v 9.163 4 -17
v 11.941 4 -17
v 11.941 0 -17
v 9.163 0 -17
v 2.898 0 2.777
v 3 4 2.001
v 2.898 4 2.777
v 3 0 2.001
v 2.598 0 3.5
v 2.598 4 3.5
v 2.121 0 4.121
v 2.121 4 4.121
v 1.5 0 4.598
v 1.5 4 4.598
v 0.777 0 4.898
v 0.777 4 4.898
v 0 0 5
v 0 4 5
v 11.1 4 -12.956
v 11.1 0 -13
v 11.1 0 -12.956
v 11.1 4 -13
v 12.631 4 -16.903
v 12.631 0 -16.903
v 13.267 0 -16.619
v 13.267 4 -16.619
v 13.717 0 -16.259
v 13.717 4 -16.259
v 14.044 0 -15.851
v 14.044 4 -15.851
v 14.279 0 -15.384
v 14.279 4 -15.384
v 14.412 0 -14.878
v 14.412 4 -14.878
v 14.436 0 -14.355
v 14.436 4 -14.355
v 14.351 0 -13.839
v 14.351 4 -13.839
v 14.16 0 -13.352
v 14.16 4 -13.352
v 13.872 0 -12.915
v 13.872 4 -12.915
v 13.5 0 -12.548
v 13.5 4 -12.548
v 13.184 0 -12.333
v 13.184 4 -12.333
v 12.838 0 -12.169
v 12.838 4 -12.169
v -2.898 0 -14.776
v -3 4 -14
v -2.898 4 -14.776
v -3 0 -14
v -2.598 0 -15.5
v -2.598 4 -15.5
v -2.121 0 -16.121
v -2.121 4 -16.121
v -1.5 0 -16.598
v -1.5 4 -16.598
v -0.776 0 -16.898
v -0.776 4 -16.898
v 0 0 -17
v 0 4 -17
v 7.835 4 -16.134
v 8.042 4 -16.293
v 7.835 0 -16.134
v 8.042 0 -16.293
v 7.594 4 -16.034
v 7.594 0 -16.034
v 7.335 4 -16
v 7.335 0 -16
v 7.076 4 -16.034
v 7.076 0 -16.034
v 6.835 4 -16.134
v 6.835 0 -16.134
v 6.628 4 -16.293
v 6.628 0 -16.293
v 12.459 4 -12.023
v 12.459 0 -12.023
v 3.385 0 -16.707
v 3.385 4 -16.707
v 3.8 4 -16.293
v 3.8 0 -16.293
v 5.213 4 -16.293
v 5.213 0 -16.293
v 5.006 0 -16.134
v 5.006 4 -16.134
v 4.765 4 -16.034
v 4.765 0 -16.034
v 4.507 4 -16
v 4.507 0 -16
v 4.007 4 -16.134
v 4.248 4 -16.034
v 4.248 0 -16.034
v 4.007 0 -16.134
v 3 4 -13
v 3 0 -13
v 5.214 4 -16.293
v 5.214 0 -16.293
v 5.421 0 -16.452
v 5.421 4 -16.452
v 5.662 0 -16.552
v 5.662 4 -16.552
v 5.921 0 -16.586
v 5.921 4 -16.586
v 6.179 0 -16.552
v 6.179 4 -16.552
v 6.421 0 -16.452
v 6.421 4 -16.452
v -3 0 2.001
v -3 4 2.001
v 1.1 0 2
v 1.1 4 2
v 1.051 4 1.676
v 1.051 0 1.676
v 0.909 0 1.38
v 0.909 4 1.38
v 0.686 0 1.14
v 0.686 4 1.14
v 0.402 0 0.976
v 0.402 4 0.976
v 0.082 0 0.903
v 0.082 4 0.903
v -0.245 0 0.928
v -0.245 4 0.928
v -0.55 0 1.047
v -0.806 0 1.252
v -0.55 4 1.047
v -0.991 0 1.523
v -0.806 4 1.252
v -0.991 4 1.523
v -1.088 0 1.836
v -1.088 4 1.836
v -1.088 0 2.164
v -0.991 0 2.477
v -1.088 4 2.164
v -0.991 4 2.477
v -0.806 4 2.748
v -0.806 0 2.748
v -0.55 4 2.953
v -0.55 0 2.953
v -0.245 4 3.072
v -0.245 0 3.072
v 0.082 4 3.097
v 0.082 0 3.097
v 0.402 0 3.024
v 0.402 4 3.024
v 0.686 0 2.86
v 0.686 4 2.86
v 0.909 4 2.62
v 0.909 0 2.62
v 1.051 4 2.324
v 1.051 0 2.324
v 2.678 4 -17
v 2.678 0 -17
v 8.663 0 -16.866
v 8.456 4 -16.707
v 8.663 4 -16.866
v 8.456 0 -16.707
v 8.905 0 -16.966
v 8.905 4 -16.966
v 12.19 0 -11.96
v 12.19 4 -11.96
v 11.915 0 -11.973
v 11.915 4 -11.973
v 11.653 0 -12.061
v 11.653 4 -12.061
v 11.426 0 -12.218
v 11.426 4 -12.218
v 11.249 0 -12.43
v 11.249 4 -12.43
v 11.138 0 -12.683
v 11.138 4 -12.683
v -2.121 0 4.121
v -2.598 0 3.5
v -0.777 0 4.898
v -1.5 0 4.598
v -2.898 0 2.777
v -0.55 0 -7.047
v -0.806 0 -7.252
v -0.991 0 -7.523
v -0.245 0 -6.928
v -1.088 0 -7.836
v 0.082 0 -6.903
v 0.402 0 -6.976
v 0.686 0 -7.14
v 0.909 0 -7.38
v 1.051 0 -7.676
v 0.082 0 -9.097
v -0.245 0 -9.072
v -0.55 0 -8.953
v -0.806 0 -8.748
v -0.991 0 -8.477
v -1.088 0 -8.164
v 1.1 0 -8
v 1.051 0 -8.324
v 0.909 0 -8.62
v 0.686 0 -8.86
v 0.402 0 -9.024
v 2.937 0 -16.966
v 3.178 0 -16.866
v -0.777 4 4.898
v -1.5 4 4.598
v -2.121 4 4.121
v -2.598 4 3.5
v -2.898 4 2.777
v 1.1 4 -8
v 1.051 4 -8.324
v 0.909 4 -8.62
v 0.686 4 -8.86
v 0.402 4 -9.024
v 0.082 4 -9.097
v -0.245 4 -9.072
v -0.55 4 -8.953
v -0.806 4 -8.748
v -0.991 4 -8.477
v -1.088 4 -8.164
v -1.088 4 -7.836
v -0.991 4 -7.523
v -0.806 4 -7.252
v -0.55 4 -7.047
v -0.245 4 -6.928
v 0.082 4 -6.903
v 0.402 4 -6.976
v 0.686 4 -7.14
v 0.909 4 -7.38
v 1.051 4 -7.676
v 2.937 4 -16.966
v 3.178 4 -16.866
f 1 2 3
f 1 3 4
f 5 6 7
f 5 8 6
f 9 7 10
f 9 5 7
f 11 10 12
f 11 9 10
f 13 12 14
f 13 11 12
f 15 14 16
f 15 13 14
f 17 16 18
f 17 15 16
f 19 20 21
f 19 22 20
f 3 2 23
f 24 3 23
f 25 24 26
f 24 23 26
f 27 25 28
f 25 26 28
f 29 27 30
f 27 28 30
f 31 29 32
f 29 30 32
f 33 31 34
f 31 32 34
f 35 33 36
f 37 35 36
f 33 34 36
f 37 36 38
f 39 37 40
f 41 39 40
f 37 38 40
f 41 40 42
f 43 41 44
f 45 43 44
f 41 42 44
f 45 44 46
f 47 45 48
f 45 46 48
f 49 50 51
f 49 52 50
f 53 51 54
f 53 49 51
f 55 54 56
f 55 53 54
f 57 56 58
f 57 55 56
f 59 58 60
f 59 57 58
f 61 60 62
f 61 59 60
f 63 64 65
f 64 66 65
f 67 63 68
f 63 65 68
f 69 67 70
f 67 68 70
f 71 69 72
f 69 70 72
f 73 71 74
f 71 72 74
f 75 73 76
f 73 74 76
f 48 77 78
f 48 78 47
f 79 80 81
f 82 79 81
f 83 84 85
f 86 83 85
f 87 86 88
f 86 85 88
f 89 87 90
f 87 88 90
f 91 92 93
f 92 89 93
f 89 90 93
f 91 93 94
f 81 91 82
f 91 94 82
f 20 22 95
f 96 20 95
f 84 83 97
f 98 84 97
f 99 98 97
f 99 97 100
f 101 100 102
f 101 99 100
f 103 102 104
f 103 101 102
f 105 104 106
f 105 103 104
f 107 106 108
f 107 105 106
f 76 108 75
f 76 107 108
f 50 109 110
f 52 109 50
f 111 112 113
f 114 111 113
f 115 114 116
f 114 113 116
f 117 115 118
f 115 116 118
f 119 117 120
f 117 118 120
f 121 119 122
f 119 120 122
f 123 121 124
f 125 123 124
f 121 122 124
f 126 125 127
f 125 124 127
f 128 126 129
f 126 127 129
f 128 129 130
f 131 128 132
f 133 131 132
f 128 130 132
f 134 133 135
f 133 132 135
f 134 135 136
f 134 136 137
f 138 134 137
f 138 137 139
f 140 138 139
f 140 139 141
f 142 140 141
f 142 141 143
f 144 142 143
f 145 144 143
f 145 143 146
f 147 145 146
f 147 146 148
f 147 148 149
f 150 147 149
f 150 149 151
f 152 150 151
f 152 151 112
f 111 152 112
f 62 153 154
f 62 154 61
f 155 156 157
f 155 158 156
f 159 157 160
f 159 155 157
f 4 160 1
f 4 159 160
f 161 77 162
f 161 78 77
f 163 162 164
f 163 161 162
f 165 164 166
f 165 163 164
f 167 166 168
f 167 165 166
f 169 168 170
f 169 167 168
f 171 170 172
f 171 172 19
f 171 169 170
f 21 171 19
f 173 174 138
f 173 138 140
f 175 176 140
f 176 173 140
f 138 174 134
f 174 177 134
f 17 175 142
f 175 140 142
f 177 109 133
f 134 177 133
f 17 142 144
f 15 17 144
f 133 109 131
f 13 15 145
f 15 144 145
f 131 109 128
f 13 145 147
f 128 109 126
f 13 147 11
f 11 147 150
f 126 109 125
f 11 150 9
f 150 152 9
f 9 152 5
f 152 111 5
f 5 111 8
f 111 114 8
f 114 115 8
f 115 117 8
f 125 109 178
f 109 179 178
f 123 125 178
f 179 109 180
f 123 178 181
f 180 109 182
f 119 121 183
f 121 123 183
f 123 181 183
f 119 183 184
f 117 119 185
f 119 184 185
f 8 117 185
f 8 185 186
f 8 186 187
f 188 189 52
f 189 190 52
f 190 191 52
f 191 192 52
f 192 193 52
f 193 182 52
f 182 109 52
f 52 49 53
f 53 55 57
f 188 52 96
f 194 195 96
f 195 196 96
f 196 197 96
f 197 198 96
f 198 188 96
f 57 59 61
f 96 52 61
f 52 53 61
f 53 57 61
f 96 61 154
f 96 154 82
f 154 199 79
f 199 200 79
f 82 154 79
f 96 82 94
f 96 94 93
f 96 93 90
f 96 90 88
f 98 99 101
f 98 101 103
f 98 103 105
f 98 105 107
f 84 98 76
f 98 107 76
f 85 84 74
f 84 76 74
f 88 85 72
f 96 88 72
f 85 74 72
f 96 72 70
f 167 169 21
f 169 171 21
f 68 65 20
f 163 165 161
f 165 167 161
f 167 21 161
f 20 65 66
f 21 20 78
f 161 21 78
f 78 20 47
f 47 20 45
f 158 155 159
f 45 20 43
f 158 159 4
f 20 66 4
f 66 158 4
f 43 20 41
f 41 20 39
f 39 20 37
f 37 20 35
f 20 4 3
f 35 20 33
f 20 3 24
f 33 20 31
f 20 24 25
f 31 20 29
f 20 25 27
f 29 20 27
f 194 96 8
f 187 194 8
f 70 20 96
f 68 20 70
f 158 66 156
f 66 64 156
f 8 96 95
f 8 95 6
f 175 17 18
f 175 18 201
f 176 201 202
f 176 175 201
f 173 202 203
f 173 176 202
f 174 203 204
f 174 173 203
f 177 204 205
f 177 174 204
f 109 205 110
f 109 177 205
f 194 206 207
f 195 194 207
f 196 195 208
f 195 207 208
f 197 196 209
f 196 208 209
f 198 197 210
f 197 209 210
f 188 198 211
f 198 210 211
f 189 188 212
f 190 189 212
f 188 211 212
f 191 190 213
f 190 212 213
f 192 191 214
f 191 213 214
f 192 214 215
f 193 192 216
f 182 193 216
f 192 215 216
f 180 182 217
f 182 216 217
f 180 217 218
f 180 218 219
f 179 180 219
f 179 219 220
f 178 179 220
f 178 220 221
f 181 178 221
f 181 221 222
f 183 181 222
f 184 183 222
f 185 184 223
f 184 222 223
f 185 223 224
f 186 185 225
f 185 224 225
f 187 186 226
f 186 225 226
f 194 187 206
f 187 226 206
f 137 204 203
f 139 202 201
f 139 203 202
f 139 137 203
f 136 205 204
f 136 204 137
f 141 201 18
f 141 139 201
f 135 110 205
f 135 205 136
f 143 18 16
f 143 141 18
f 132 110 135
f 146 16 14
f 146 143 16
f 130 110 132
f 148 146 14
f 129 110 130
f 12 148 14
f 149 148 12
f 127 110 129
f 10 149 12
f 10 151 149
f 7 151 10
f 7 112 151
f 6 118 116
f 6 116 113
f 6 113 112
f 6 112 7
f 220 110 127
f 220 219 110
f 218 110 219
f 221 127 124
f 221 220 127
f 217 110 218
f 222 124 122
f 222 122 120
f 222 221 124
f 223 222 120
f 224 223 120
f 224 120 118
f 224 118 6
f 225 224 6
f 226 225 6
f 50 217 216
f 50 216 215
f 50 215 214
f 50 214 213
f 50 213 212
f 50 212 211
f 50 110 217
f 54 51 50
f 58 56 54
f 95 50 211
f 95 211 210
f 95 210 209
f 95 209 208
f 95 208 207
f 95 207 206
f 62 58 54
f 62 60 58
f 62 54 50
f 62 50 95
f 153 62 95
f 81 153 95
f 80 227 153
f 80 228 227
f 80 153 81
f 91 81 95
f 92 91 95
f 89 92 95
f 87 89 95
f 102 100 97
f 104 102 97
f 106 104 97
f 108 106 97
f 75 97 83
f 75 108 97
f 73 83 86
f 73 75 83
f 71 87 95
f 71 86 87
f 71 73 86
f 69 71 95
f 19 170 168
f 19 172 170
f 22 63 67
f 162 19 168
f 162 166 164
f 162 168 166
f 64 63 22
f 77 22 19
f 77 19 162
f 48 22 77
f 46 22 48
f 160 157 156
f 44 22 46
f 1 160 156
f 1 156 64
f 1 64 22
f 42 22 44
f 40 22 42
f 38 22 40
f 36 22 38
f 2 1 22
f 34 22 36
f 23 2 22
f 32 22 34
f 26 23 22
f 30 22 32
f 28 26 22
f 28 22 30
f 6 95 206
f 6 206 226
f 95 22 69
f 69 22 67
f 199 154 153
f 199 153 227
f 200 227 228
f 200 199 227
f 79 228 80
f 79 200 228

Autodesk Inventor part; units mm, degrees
ref_plane "YZ Plane" through (0, 0, 0) normal (1, 0, 0) x (0, 1, 0)
ref_plane "XZ Plane" through (0, 0, 0) normal (0, 1, 0) x (-1, 0, 0)
ref_plane "XY Plane" through (0, 0, 0) normal (0, 0, 1) x (1, 0, 0)
sketch "Sketch1" plane through (0, 0, 0) normal (0, 1, 0) x (-1, 0, 0)
  line L0 (-3, 13) -> (3, 13)
  line L1 (3, 13) -> (3, -13)
  line L2 (3, -13) -> (-3, -13)
  line L3 (-3, -13) -> (-3, 13)
  line L4 (-3, 13) -> (3, -13) construction
  line L5 (3, 13) -> (-3, -13) construction
  point P0 (0, 0)
  dimension "d0" = 6
  dimension "d1" = 26
extrude "Extrusion1" add sketch "Sketch1" along normal blind 4
sketch "Sketch2" plane through (3, 0, -13) normal (0, 0, -1) x (-1, 0, 0)
  line L0 (0, 0) -> (6, 0) projected
  line L1 (6, 0) -> (-12, 0)
  line L2 (-12, 0) -> (-12, 4)
  line L3 (-12, 4) -> (6, 4)
  line L4 (6, 4) -> (6, 0)
  point P0 (3, 0)
  dimension "d4" = 18
  dimension "d5" = 4
extrude "Extrusion2" add sketch "Sketch2" along normal blind 4
sketch "Sketch3" plane through (0, 4, 0) normal (0, 1, 0) x (1, 0, 0)
  line L0 (3, -13) -> (3, 13) projected
  line L1 (3, 13) -> (0, 13)
  line L2 (0, 13) -> (0, 8)
  line L3 (0, 8) -> (0, -2)
  circle A0 centre (0, 8) radius 1.1
  circle A1 centre (0, -2) radius 1.1
  point P0 (0, 0)
  dimension "d8" = 5
  dimension "d9" = 10
  dimension "d10" = 2.2
  dimension "d11" = 2.2
extrude "Extrusion3" cut sketch "Sketch3" against normal up to next
sketch "Sketch4" plane through (0, 4, 0) normal (0, 1, 0) x (1, 0, 0)
  line L0 (3, 13) -> (3, -13) projected
  line L1 (-3, -13) -> (-3, 17) projected
  line L2 (3, -13) -> (-3, -13)
  line L3 (-3, -13) -> (-3, -5)
  line L4 (-3, -5) -> (3, -5)
  line L5 (3, -5) -> (3, -13)
  point P0 (0, 0)
  dimension "d14" = 8
extrude "Extrusion4" cut sketch "Sketch4" against normal blind 4
fillet "Fillet1" radius 3 2 edges at (3, 2, 5) (-3, 2, 5)
sketch "Sketch5" plane through (0, 4, 0) normal (0, 1, 0) x (1, 0, 0)
  line L0 (15, 13) -> (11.1, 13)
  line L1 (3, 13) -> (15, 13) projected
  line L2 (11.1, 13) -> (11.1, 11.5)
  line L3 (11.1, 11.5) -> (15, 13)
  point P0 (0, 0)
  dimension "d18" = 3.9
  dimension "d19" = 1.5
extrude "Extrusion5" add sketch "Sketch5" against normal blind 4
fillet "Fillet2" radius 1 1 edges at (11.1, 2, -11.5)
fillet "Fillet3" radius 3 1 edges at (-3, 2, -17)
sketch "Sketch6" plane through (0, 4, 0) normal (0, 1, 0) x (1, 0, 0)
  line L0 (0, 17) -> (15, 17) projected
  line L1 (3.0924, 17) -> (4.5066, 15.5858)
  line L2 (3.0924, 17) -> (5.0924, 17) construction
  line L3 (4.5066, 15.5858) -> (5.9208, 17)
  line L4 (5.9208, 17) -> (7.335, 15.5858)
  line L5 (5.9208, 17) -> (7.9208, 17) construction
  line L6 (7.335, 15.5858) -> (8.7492, 17)
  point P0 (0, 0)
  dimension "d24" = 2
  dimension "d25" = 45
  dimension "d26" = 2
  dimension "d27" = 45
extrude "Extrusion6" cut sketch "Sketch6" against normal up to next
fillet "Fillet4" radius 1 5 edges at (3.0924, 2, -17) (4.5066, 2, -15.5858) (5.9208, 2, -17) (7.335, 2, -15.5858) (8.7492, 2, -17)
fillet "Fillet5" radius 2.5 2 edges at (15, 2, -17) (15, 2, -13)
properties part number "arm_lock" material "Nylon 6/6"
